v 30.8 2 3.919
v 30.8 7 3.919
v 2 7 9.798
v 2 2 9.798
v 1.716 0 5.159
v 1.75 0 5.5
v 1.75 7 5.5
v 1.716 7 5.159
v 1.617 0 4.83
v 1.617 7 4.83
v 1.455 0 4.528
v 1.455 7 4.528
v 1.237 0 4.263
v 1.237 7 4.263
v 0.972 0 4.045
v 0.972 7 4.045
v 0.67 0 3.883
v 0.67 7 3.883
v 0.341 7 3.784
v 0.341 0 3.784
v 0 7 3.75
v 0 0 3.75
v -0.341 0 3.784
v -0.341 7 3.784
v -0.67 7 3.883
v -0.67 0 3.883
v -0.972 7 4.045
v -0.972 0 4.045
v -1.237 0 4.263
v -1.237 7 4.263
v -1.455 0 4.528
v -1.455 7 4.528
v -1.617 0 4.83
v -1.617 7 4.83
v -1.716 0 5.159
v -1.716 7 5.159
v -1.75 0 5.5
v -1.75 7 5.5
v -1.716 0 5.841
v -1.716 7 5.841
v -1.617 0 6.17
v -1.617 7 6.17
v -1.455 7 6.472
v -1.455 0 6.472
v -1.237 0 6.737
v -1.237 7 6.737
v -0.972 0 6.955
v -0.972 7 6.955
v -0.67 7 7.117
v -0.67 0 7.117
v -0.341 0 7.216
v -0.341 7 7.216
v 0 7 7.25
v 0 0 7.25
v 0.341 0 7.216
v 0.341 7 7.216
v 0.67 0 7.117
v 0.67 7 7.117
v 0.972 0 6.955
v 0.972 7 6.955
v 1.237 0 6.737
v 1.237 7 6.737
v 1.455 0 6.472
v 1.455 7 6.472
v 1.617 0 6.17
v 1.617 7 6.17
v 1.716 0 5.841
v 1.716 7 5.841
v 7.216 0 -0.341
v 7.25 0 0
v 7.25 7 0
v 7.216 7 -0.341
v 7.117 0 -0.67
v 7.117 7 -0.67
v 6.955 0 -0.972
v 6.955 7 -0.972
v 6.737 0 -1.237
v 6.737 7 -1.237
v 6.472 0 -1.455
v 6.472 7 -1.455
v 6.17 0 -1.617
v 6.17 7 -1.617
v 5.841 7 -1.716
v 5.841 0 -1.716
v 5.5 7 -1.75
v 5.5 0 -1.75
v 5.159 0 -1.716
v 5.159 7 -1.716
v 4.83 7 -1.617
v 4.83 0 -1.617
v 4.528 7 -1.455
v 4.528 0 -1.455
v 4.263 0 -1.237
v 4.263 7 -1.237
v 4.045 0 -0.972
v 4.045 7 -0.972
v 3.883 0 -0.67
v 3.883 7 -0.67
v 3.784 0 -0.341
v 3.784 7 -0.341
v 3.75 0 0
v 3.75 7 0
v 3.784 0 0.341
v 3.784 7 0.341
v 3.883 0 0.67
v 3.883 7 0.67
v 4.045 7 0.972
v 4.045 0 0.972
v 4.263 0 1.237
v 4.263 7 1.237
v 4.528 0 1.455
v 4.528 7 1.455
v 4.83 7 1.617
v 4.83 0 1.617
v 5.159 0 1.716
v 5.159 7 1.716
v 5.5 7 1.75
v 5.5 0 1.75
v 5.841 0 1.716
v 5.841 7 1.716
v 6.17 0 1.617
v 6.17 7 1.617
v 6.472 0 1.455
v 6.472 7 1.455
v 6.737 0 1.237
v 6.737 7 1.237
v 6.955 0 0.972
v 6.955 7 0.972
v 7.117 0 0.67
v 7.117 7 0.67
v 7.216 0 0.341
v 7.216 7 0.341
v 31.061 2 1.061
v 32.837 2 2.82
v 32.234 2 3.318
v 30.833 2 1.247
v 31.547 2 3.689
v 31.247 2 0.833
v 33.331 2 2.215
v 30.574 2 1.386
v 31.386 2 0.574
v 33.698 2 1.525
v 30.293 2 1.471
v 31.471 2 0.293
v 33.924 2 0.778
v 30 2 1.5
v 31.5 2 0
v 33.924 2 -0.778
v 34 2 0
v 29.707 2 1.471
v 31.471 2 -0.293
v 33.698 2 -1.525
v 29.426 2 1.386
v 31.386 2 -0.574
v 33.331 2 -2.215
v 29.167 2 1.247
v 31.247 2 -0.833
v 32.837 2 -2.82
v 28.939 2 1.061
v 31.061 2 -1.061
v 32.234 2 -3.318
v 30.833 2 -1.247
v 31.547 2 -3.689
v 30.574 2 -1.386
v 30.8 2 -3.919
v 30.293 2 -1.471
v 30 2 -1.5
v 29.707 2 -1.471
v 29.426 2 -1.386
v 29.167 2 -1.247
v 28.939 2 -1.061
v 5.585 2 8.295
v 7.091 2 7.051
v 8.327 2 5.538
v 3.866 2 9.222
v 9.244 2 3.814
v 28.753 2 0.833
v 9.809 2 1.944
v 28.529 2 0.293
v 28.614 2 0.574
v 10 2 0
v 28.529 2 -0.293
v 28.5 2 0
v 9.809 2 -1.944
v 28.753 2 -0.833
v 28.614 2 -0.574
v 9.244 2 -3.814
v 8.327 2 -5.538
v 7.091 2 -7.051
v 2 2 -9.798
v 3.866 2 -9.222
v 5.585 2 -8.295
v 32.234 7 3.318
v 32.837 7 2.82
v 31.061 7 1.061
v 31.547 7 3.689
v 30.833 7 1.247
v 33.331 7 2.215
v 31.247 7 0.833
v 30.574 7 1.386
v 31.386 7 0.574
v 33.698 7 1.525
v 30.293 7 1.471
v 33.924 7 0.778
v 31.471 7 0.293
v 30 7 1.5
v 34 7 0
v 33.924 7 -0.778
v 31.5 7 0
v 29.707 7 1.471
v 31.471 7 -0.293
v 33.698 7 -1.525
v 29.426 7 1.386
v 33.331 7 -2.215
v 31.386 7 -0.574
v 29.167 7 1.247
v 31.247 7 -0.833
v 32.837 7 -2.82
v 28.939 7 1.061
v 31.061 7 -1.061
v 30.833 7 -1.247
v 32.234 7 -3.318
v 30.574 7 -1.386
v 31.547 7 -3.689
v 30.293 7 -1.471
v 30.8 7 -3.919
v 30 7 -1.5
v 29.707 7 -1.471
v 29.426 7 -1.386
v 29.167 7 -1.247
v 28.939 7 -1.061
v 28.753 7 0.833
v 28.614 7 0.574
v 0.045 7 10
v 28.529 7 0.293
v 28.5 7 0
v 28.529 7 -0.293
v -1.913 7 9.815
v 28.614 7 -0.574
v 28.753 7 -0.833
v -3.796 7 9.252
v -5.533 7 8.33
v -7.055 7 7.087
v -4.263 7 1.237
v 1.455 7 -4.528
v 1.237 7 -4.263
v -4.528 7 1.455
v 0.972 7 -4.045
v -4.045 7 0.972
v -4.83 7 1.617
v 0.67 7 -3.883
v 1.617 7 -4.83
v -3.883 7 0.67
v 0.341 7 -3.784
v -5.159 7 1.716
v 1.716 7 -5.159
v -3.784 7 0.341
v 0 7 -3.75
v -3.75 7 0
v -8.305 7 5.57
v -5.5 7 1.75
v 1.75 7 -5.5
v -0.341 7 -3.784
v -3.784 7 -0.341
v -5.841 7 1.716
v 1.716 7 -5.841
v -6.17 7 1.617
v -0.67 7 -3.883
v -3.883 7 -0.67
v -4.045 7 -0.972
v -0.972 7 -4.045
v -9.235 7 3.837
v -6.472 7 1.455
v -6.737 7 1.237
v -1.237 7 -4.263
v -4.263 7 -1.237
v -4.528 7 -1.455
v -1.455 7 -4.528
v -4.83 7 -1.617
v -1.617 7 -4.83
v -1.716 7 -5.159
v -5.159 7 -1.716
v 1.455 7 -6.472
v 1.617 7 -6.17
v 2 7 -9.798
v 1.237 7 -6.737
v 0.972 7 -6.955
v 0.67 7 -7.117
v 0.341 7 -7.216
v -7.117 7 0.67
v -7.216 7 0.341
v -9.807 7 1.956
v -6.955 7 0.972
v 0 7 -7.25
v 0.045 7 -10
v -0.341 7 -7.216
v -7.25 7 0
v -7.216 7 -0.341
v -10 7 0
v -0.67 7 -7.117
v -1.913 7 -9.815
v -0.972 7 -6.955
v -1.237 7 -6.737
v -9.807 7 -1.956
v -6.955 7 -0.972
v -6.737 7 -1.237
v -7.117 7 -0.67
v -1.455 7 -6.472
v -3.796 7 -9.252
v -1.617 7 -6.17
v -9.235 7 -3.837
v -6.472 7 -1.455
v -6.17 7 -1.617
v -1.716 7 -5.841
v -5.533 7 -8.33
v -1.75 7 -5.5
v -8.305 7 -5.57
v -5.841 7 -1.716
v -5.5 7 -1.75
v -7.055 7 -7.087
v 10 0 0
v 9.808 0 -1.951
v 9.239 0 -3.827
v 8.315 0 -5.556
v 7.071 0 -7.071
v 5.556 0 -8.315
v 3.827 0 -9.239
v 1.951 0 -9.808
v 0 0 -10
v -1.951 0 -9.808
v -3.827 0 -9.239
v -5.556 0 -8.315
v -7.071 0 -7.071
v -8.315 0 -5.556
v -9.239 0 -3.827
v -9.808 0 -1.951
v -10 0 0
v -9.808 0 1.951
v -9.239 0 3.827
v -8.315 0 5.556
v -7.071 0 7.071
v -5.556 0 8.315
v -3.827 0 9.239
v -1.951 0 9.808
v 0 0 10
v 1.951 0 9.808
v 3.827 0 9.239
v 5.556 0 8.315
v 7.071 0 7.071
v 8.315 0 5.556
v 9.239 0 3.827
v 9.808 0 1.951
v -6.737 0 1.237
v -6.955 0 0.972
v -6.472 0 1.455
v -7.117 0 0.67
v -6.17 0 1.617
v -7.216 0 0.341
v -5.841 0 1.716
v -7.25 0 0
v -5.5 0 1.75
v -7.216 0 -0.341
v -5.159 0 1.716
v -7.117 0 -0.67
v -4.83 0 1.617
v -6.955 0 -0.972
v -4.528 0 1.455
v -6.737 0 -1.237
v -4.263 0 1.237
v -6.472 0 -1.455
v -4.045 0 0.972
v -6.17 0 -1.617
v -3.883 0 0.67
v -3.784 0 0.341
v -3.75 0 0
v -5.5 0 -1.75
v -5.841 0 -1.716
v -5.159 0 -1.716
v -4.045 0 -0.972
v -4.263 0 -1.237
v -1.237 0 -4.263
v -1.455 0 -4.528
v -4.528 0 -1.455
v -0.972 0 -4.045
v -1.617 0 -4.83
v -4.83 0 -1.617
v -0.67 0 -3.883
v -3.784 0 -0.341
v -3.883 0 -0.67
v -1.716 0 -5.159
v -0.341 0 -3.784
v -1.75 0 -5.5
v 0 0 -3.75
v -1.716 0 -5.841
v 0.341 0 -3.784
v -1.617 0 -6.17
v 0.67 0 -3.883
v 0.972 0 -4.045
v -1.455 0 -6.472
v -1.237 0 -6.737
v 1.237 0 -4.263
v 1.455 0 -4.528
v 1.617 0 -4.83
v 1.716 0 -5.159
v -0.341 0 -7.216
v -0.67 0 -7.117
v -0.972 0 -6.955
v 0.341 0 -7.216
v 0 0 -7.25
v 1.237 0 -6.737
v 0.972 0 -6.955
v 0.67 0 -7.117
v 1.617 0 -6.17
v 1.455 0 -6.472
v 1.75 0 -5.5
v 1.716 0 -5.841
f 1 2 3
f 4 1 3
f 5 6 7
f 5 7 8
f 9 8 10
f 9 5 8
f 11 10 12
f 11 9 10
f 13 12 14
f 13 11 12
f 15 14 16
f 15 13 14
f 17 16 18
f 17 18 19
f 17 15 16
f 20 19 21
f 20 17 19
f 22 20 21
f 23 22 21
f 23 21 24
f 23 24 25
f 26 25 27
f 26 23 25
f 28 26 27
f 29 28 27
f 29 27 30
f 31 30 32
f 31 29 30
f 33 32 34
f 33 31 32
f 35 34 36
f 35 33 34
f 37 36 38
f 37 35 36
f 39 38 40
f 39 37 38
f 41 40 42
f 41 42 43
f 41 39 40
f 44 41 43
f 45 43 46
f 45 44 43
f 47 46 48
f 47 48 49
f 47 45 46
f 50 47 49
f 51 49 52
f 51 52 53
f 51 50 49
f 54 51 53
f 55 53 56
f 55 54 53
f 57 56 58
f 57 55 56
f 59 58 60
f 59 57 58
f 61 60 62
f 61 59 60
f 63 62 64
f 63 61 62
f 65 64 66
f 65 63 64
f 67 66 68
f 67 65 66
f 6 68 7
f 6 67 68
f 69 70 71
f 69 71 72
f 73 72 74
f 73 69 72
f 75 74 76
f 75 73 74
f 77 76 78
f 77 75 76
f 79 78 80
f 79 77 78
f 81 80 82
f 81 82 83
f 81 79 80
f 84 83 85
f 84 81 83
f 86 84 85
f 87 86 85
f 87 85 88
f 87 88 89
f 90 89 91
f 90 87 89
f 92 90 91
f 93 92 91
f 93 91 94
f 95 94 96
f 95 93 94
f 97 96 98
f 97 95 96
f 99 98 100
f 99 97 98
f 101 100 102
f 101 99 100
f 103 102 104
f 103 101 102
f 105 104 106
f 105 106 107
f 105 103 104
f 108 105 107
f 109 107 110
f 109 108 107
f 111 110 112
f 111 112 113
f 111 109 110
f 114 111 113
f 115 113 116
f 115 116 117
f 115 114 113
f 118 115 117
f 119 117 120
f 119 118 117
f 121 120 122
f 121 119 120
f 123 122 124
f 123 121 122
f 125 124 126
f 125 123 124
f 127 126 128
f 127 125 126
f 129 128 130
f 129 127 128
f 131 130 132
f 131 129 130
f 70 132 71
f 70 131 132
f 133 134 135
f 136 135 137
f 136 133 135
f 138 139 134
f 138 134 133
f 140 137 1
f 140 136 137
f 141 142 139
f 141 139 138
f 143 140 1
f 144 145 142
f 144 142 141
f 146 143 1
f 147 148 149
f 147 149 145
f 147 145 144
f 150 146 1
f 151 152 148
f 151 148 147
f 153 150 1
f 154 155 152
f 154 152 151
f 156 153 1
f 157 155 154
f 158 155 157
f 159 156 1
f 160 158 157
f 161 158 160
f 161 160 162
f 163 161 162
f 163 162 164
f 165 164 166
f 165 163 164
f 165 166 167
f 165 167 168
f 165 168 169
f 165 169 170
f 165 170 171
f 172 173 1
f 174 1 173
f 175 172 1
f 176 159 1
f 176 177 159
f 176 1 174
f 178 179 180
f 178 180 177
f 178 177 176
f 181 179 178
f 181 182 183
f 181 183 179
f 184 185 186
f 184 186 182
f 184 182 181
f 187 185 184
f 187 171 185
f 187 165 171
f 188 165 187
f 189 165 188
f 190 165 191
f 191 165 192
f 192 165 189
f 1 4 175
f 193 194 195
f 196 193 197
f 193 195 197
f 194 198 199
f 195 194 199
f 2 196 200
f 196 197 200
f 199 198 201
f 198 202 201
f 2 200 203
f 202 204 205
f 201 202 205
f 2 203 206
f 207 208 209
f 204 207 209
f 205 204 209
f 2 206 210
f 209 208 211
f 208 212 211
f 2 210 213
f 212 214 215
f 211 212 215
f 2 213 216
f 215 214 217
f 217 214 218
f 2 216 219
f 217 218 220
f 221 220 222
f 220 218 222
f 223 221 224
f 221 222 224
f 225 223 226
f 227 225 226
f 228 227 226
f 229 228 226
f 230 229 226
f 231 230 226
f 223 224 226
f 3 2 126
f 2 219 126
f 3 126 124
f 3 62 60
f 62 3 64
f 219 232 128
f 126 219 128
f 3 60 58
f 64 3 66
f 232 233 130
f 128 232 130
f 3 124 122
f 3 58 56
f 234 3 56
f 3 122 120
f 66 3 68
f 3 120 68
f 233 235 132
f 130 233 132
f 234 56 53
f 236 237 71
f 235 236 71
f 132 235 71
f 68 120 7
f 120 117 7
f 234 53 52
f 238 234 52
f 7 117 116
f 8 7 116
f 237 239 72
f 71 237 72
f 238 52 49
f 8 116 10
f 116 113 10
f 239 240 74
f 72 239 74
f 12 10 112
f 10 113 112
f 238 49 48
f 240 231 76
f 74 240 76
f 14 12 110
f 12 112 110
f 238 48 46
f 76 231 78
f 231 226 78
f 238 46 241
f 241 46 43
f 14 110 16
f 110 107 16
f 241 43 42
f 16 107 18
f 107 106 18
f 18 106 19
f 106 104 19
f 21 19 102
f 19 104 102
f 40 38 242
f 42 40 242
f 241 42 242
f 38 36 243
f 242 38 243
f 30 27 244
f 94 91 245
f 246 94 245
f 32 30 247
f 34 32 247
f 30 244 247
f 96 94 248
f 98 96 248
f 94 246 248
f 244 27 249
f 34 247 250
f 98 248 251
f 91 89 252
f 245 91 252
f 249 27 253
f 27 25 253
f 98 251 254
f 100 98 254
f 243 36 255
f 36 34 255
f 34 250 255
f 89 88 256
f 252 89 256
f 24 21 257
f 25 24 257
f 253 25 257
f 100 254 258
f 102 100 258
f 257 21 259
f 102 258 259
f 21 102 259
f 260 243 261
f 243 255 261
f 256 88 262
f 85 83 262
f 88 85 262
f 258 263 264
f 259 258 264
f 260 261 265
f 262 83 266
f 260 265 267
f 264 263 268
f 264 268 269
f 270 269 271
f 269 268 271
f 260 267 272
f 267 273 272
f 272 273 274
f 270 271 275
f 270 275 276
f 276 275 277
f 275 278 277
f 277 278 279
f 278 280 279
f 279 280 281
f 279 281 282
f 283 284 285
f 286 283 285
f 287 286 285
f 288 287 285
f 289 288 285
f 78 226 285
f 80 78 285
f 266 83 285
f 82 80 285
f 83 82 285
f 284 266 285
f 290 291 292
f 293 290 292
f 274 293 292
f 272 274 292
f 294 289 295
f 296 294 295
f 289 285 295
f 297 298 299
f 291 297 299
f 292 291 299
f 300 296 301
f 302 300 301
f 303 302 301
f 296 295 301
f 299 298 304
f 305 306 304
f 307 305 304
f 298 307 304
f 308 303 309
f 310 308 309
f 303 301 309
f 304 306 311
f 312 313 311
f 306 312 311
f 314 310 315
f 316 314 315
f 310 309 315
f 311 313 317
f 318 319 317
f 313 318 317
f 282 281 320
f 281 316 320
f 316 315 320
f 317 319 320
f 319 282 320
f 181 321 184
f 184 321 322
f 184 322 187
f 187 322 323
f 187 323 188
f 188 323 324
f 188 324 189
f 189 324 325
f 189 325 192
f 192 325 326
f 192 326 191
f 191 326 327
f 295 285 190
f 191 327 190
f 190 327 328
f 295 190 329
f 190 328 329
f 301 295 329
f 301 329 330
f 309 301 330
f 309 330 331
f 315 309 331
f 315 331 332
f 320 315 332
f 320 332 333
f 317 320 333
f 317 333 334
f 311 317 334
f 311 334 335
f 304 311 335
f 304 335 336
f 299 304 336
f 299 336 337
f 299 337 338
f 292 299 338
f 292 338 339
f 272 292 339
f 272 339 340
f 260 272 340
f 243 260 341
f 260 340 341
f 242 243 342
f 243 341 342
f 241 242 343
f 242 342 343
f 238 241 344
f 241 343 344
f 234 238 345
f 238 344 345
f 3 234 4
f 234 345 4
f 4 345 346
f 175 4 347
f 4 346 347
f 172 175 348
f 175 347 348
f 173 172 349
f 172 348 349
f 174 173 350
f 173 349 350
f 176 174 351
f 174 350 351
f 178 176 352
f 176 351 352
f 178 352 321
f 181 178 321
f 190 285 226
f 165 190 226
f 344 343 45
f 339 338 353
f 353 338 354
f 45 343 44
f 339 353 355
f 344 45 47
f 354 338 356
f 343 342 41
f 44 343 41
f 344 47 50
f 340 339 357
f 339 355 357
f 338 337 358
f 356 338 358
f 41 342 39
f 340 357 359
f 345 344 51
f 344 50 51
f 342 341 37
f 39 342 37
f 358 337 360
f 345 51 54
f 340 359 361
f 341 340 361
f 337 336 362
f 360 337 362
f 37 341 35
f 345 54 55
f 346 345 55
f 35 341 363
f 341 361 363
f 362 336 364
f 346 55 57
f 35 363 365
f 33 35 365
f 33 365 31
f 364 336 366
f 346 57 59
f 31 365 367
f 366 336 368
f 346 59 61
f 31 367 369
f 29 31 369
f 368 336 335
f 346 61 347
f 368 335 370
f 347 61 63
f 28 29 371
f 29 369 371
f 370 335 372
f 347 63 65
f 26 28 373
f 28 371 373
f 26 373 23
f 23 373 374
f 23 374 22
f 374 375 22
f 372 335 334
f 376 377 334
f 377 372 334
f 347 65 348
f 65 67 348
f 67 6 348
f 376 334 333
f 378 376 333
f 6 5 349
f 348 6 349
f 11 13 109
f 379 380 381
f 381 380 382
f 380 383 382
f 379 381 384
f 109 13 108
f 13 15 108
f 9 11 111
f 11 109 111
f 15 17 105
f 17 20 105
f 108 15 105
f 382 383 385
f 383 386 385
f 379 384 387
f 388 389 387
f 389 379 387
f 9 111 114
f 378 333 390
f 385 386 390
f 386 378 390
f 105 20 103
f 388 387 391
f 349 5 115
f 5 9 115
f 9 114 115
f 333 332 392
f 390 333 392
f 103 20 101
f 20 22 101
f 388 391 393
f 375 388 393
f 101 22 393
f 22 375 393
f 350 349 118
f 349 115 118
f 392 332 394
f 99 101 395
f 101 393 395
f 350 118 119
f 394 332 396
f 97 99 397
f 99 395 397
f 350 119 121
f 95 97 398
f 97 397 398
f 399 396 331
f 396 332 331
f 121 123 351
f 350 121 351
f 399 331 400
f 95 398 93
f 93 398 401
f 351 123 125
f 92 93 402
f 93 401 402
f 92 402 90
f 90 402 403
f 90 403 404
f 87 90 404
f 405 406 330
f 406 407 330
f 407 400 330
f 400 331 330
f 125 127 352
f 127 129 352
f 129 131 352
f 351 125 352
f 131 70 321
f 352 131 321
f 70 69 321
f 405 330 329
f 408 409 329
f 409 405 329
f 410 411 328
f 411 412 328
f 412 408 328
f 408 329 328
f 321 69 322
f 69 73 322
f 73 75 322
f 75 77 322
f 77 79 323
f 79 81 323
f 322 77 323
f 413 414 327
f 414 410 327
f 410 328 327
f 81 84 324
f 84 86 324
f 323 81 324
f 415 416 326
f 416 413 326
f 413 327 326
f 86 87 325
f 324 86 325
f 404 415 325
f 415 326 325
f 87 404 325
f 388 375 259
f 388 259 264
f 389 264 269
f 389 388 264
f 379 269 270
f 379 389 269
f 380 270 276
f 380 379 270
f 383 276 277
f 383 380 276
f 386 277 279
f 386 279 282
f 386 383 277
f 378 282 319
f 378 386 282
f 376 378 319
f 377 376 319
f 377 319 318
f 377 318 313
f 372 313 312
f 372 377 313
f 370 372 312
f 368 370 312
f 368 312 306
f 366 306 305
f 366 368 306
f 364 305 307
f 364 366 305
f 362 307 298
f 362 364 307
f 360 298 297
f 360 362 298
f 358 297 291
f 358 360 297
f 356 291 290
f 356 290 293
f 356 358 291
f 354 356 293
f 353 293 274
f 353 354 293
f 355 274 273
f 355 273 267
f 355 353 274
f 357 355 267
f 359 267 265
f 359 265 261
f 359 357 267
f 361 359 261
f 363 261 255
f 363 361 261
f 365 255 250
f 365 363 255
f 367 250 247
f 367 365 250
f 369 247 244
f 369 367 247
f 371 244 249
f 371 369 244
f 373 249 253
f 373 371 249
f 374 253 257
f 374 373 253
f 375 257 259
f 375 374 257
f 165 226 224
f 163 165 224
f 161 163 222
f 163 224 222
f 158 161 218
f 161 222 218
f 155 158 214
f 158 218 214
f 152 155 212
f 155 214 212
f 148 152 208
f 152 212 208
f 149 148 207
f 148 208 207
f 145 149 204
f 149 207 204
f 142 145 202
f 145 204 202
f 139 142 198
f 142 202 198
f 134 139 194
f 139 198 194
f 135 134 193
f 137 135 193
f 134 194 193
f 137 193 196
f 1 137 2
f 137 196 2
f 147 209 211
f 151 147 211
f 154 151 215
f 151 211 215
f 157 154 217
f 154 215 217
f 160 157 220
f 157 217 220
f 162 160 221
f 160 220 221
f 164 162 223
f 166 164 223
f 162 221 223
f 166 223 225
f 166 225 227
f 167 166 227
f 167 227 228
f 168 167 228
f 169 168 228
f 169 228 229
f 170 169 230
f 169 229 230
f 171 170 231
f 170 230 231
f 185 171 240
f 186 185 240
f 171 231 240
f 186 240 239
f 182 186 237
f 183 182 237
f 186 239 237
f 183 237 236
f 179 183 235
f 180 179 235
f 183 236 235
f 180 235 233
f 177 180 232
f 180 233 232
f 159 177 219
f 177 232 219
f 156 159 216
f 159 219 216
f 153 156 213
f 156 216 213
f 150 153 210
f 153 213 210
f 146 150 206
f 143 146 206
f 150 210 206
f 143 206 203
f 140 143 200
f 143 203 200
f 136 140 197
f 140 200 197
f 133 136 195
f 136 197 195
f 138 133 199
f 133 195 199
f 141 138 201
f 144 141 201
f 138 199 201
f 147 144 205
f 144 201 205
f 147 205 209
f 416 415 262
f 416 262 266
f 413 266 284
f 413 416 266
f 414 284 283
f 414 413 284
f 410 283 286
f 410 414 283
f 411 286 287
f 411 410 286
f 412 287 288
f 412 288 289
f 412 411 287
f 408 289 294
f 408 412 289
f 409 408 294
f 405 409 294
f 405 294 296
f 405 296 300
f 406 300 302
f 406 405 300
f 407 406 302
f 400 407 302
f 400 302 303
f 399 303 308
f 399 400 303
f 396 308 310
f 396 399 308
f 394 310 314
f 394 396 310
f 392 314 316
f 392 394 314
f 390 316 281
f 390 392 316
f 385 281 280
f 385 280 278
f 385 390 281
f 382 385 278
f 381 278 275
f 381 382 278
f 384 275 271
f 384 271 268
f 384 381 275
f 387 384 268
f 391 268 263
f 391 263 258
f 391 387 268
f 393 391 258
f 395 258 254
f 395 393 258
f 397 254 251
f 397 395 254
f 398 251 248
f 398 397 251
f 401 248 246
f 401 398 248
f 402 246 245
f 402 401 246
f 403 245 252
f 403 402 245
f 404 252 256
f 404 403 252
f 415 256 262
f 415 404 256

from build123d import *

# Parameters (mm, degrees)
SKETCH1_R           = 10
SKETCH1_R_2         = 1.75
BOSS_EXTRUDE1_DEPTH = 7
SKETCH2_R           = 1.5
BOSS_EXTRUDE2_DEPTH = 5


with BuildPart() as part:
    # Sketch1 → Boss-Extrude1 (new body)
    with BuildSketch(Plane(origin=(0, 0, 0), x_dir=(1, 0, 0), z_dir=(0, 1, 0))):
        Circle(SKETCH1_R)
        with Locations((0, 5.5)):
            Circle(SKETCH1_R_2, mode=Mode.SUBTRACT)
        with Locations((5.5, 0)):
            Circle(SKETCH1_R_2, mode=Mode.SUBTRACT)
        with Locations((0, -5.5)):
            Circle(SKETCH1_R_2, mode=Mode.SUBTRACT)
        with Locations((-5.5, 0)):
            Circle(SKETCH1_R_2, mode=Mode.SUBTRACT)
    extrude(amount=BOSS_EXTRUDE1_DEPTH)

    # Sketch2 → Boss-Extrude2 (add)
    with BuildSketch(Plane(origin=(0, 7, 0), x_dir=(1, 0, 0), z_dir=(0, 1, 0))):
        with BuildLine():
            Line((2, 9.797958971), (30.8, 3.919183588))
            ThreePointArc((30.8, 3.919183588), (34, 0), (30.8, -3.919183588))
            Line((30.8, -3.919183588), (2, -9.797958971))
            ThreePointArc((2, -9.797958971), (10, 0), (2, 9.797958971))
        make_face()
        with Locations((30, 0)):
            Circle(SKETCH2_R, mode=Mode.SUBTRACT)
    extrude(amount=-BOSS_EXTRUDE2_DEPTH)


solid = part.part
